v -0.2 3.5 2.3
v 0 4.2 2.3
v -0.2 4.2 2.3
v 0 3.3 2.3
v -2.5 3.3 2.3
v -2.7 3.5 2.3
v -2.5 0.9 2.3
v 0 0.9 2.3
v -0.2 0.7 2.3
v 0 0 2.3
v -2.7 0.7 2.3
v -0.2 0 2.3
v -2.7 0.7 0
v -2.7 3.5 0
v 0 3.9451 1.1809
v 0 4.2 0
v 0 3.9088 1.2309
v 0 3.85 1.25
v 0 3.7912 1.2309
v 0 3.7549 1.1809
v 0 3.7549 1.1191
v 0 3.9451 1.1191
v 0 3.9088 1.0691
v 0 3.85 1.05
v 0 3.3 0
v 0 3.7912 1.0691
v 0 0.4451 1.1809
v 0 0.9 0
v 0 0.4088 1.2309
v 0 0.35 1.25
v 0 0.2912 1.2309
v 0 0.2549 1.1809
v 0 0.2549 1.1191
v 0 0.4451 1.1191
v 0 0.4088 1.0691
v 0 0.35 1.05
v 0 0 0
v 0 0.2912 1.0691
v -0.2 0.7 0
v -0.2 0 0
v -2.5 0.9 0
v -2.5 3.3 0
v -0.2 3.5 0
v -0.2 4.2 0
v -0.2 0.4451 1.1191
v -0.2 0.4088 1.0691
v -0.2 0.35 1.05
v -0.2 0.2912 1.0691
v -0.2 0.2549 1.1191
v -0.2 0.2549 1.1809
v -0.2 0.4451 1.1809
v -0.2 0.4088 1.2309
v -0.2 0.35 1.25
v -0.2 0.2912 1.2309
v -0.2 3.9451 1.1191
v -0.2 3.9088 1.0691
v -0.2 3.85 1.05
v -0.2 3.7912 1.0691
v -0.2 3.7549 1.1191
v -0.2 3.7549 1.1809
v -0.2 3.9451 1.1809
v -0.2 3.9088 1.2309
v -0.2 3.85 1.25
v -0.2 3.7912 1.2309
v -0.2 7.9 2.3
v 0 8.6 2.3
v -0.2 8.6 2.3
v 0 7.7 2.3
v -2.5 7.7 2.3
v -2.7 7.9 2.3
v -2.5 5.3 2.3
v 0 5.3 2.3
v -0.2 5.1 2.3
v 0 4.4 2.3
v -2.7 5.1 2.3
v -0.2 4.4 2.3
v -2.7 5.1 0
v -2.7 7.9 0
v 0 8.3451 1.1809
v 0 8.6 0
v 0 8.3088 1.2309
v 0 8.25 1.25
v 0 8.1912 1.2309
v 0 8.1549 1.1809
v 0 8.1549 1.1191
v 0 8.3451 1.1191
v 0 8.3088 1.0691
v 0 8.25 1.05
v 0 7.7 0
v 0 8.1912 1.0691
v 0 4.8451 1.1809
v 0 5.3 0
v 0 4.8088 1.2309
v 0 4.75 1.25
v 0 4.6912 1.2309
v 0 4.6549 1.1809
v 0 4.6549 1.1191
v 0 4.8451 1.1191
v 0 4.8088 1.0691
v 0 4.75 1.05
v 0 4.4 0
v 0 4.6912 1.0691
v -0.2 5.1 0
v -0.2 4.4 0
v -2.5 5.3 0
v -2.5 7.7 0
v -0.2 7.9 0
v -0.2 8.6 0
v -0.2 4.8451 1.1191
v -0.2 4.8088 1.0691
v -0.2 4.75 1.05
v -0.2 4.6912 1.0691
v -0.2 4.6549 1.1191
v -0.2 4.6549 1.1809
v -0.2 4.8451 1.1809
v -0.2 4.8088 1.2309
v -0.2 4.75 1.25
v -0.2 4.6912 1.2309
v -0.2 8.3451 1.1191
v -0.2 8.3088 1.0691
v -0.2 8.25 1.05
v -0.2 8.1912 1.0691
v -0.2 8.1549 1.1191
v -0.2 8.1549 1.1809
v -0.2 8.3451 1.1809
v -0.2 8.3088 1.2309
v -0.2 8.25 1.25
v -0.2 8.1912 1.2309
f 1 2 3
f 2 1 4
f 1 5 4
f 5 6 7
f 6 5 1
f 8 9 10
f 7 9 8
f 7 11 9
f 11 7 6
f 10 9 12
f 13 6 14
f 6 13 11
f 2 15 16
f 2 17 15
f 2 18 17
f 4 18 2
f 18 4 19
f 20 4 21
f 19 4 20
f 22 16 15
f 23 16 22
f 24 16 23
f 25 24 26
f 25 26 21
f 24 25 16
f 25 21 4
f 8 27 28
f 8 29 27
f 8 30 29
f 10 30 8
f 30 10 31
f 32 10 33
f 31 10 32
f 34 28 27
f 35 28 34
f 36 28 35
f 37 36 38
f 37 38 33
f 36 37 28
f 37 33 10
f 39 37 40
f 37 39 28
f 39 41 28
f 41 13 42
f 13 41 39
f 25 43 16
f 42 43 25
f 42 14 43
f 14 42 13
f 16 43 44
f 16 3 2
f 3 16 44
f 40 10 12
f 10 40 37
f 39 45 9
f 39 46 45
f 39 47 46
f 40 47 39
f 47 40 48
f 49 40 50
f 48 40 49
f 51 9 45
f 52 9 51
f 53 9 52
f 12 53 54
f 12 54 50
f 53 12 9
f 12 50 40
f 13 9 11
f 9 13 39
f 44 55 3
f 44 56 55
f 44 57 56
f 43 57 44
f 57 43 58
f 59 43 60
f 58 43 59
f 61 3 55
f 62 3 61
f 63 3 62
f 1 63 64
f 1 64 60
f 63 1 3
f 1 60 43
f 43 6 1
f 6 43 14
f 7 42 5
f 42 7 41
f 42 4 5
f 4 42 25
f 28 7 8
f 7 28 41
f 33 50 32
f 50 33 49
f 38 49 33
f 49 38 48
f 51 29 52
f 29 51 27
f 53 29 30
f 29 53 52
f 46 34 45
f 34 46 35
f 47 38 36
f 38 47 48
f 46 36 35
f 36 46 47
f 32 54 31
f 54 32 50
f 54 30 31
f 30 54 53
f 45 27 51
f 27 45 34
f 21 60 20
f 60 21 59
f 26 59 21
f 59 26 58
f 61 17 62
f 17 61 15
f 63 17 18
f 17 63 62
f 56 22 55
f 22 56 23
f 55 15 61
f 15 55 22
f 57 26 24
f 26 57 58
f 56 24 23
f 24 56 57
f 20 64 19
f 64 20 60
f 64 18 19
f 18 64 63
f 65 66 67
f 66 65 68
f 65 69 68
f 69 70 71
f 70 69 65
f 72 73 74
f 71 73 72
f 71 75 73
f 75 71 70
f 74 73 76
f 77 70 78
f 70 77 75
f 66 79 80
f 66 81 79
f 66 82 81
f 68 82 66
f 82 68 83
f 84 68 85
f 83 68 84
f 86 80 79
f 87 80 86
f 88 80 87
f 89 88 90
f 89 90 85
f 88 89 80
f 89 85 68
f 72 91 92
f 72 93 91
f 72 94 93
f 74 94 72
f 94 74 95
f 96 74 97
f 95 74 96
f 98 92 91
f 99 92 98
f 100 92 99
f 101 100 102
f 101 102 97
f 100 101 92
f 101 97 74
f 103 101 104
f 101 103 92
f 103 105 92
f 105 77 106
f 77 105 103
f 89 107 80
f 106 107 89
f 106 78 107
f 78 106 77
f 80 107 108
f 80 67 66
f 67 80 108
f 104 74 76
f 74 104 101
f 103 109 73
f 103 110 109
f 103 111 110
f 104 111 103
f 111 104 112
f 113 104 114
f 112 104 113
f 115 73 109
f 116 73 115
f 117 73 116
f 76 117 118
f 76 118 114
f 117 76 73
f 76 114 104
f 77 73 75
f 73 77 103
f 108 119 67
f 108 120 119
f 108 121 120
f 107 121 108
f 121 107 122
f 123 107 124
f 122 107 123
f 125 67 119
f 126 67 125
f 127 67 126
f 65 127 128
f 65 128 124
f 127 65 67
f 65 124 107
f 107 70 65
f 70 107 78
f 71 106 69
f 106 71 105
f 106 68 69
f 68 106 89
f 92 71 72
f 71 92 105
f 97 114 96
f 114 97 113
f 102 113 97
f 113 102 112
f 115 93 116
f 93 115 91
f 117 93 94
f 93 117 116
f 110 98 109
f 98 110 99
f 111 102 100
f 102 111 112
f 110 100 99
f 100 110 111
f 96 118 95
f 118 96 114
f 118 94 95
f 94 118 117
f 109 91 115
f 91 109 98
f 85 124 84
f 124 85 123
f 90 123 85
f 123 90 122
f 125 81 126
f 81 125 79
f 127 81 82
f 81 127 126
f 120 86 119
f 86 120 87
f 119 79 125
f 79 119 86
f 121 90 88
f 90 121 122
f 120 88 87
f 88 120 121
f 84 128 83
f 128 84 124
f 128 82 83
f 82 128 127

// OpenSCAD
rotate([0, -90, 0]) {
    difference() {
        cube([2.3, 4.2, 2.7]);
        translate([0, 0, 0.2]) {
            cube([2.3, 0.7, 2.5]);
        }
        translate([0, 3.5, 0.2]) {
            cube([2.3, 0.7, 2.5]);
        }
        translate([0, 0.9, 0.0]) {
            cube([2.3, 2.4, 2.5]);
        }
        translate([1.15, 0.35, 0]) {
                cylinder(r=0.1, h=0.9, $fn = 10);
            }
         translate([1.15, 3.85, 0]) {
                cylinder(r=0.1, h=0.9, $fn = 10);
            }
    }
    translate([0, 4.4, 0]) {
        difference() {
            cube([2.3, 4.2, 2.7]);
            translate([0, 0, 0.2]) {
                cube([2.3, 0.7, 2.5]);
            }
            translate([0, 3.5, 0.2]) {
                cube([2.3, 0.7, 2.5]);
            }
            translate([0, 0.9, 0.0]) {
                cube([2.3, 2.4, 2.5]);
            }
           translate([1.15, 0.35, 0]) {
                cylinder(r=0.1, h=0.9, $fn = 10);
            }
         translate([1.15, 3.85, 0]) {
                cylinder(r=0.1, h=0.9, $fn = 10);
            }
        }
    } 
}
